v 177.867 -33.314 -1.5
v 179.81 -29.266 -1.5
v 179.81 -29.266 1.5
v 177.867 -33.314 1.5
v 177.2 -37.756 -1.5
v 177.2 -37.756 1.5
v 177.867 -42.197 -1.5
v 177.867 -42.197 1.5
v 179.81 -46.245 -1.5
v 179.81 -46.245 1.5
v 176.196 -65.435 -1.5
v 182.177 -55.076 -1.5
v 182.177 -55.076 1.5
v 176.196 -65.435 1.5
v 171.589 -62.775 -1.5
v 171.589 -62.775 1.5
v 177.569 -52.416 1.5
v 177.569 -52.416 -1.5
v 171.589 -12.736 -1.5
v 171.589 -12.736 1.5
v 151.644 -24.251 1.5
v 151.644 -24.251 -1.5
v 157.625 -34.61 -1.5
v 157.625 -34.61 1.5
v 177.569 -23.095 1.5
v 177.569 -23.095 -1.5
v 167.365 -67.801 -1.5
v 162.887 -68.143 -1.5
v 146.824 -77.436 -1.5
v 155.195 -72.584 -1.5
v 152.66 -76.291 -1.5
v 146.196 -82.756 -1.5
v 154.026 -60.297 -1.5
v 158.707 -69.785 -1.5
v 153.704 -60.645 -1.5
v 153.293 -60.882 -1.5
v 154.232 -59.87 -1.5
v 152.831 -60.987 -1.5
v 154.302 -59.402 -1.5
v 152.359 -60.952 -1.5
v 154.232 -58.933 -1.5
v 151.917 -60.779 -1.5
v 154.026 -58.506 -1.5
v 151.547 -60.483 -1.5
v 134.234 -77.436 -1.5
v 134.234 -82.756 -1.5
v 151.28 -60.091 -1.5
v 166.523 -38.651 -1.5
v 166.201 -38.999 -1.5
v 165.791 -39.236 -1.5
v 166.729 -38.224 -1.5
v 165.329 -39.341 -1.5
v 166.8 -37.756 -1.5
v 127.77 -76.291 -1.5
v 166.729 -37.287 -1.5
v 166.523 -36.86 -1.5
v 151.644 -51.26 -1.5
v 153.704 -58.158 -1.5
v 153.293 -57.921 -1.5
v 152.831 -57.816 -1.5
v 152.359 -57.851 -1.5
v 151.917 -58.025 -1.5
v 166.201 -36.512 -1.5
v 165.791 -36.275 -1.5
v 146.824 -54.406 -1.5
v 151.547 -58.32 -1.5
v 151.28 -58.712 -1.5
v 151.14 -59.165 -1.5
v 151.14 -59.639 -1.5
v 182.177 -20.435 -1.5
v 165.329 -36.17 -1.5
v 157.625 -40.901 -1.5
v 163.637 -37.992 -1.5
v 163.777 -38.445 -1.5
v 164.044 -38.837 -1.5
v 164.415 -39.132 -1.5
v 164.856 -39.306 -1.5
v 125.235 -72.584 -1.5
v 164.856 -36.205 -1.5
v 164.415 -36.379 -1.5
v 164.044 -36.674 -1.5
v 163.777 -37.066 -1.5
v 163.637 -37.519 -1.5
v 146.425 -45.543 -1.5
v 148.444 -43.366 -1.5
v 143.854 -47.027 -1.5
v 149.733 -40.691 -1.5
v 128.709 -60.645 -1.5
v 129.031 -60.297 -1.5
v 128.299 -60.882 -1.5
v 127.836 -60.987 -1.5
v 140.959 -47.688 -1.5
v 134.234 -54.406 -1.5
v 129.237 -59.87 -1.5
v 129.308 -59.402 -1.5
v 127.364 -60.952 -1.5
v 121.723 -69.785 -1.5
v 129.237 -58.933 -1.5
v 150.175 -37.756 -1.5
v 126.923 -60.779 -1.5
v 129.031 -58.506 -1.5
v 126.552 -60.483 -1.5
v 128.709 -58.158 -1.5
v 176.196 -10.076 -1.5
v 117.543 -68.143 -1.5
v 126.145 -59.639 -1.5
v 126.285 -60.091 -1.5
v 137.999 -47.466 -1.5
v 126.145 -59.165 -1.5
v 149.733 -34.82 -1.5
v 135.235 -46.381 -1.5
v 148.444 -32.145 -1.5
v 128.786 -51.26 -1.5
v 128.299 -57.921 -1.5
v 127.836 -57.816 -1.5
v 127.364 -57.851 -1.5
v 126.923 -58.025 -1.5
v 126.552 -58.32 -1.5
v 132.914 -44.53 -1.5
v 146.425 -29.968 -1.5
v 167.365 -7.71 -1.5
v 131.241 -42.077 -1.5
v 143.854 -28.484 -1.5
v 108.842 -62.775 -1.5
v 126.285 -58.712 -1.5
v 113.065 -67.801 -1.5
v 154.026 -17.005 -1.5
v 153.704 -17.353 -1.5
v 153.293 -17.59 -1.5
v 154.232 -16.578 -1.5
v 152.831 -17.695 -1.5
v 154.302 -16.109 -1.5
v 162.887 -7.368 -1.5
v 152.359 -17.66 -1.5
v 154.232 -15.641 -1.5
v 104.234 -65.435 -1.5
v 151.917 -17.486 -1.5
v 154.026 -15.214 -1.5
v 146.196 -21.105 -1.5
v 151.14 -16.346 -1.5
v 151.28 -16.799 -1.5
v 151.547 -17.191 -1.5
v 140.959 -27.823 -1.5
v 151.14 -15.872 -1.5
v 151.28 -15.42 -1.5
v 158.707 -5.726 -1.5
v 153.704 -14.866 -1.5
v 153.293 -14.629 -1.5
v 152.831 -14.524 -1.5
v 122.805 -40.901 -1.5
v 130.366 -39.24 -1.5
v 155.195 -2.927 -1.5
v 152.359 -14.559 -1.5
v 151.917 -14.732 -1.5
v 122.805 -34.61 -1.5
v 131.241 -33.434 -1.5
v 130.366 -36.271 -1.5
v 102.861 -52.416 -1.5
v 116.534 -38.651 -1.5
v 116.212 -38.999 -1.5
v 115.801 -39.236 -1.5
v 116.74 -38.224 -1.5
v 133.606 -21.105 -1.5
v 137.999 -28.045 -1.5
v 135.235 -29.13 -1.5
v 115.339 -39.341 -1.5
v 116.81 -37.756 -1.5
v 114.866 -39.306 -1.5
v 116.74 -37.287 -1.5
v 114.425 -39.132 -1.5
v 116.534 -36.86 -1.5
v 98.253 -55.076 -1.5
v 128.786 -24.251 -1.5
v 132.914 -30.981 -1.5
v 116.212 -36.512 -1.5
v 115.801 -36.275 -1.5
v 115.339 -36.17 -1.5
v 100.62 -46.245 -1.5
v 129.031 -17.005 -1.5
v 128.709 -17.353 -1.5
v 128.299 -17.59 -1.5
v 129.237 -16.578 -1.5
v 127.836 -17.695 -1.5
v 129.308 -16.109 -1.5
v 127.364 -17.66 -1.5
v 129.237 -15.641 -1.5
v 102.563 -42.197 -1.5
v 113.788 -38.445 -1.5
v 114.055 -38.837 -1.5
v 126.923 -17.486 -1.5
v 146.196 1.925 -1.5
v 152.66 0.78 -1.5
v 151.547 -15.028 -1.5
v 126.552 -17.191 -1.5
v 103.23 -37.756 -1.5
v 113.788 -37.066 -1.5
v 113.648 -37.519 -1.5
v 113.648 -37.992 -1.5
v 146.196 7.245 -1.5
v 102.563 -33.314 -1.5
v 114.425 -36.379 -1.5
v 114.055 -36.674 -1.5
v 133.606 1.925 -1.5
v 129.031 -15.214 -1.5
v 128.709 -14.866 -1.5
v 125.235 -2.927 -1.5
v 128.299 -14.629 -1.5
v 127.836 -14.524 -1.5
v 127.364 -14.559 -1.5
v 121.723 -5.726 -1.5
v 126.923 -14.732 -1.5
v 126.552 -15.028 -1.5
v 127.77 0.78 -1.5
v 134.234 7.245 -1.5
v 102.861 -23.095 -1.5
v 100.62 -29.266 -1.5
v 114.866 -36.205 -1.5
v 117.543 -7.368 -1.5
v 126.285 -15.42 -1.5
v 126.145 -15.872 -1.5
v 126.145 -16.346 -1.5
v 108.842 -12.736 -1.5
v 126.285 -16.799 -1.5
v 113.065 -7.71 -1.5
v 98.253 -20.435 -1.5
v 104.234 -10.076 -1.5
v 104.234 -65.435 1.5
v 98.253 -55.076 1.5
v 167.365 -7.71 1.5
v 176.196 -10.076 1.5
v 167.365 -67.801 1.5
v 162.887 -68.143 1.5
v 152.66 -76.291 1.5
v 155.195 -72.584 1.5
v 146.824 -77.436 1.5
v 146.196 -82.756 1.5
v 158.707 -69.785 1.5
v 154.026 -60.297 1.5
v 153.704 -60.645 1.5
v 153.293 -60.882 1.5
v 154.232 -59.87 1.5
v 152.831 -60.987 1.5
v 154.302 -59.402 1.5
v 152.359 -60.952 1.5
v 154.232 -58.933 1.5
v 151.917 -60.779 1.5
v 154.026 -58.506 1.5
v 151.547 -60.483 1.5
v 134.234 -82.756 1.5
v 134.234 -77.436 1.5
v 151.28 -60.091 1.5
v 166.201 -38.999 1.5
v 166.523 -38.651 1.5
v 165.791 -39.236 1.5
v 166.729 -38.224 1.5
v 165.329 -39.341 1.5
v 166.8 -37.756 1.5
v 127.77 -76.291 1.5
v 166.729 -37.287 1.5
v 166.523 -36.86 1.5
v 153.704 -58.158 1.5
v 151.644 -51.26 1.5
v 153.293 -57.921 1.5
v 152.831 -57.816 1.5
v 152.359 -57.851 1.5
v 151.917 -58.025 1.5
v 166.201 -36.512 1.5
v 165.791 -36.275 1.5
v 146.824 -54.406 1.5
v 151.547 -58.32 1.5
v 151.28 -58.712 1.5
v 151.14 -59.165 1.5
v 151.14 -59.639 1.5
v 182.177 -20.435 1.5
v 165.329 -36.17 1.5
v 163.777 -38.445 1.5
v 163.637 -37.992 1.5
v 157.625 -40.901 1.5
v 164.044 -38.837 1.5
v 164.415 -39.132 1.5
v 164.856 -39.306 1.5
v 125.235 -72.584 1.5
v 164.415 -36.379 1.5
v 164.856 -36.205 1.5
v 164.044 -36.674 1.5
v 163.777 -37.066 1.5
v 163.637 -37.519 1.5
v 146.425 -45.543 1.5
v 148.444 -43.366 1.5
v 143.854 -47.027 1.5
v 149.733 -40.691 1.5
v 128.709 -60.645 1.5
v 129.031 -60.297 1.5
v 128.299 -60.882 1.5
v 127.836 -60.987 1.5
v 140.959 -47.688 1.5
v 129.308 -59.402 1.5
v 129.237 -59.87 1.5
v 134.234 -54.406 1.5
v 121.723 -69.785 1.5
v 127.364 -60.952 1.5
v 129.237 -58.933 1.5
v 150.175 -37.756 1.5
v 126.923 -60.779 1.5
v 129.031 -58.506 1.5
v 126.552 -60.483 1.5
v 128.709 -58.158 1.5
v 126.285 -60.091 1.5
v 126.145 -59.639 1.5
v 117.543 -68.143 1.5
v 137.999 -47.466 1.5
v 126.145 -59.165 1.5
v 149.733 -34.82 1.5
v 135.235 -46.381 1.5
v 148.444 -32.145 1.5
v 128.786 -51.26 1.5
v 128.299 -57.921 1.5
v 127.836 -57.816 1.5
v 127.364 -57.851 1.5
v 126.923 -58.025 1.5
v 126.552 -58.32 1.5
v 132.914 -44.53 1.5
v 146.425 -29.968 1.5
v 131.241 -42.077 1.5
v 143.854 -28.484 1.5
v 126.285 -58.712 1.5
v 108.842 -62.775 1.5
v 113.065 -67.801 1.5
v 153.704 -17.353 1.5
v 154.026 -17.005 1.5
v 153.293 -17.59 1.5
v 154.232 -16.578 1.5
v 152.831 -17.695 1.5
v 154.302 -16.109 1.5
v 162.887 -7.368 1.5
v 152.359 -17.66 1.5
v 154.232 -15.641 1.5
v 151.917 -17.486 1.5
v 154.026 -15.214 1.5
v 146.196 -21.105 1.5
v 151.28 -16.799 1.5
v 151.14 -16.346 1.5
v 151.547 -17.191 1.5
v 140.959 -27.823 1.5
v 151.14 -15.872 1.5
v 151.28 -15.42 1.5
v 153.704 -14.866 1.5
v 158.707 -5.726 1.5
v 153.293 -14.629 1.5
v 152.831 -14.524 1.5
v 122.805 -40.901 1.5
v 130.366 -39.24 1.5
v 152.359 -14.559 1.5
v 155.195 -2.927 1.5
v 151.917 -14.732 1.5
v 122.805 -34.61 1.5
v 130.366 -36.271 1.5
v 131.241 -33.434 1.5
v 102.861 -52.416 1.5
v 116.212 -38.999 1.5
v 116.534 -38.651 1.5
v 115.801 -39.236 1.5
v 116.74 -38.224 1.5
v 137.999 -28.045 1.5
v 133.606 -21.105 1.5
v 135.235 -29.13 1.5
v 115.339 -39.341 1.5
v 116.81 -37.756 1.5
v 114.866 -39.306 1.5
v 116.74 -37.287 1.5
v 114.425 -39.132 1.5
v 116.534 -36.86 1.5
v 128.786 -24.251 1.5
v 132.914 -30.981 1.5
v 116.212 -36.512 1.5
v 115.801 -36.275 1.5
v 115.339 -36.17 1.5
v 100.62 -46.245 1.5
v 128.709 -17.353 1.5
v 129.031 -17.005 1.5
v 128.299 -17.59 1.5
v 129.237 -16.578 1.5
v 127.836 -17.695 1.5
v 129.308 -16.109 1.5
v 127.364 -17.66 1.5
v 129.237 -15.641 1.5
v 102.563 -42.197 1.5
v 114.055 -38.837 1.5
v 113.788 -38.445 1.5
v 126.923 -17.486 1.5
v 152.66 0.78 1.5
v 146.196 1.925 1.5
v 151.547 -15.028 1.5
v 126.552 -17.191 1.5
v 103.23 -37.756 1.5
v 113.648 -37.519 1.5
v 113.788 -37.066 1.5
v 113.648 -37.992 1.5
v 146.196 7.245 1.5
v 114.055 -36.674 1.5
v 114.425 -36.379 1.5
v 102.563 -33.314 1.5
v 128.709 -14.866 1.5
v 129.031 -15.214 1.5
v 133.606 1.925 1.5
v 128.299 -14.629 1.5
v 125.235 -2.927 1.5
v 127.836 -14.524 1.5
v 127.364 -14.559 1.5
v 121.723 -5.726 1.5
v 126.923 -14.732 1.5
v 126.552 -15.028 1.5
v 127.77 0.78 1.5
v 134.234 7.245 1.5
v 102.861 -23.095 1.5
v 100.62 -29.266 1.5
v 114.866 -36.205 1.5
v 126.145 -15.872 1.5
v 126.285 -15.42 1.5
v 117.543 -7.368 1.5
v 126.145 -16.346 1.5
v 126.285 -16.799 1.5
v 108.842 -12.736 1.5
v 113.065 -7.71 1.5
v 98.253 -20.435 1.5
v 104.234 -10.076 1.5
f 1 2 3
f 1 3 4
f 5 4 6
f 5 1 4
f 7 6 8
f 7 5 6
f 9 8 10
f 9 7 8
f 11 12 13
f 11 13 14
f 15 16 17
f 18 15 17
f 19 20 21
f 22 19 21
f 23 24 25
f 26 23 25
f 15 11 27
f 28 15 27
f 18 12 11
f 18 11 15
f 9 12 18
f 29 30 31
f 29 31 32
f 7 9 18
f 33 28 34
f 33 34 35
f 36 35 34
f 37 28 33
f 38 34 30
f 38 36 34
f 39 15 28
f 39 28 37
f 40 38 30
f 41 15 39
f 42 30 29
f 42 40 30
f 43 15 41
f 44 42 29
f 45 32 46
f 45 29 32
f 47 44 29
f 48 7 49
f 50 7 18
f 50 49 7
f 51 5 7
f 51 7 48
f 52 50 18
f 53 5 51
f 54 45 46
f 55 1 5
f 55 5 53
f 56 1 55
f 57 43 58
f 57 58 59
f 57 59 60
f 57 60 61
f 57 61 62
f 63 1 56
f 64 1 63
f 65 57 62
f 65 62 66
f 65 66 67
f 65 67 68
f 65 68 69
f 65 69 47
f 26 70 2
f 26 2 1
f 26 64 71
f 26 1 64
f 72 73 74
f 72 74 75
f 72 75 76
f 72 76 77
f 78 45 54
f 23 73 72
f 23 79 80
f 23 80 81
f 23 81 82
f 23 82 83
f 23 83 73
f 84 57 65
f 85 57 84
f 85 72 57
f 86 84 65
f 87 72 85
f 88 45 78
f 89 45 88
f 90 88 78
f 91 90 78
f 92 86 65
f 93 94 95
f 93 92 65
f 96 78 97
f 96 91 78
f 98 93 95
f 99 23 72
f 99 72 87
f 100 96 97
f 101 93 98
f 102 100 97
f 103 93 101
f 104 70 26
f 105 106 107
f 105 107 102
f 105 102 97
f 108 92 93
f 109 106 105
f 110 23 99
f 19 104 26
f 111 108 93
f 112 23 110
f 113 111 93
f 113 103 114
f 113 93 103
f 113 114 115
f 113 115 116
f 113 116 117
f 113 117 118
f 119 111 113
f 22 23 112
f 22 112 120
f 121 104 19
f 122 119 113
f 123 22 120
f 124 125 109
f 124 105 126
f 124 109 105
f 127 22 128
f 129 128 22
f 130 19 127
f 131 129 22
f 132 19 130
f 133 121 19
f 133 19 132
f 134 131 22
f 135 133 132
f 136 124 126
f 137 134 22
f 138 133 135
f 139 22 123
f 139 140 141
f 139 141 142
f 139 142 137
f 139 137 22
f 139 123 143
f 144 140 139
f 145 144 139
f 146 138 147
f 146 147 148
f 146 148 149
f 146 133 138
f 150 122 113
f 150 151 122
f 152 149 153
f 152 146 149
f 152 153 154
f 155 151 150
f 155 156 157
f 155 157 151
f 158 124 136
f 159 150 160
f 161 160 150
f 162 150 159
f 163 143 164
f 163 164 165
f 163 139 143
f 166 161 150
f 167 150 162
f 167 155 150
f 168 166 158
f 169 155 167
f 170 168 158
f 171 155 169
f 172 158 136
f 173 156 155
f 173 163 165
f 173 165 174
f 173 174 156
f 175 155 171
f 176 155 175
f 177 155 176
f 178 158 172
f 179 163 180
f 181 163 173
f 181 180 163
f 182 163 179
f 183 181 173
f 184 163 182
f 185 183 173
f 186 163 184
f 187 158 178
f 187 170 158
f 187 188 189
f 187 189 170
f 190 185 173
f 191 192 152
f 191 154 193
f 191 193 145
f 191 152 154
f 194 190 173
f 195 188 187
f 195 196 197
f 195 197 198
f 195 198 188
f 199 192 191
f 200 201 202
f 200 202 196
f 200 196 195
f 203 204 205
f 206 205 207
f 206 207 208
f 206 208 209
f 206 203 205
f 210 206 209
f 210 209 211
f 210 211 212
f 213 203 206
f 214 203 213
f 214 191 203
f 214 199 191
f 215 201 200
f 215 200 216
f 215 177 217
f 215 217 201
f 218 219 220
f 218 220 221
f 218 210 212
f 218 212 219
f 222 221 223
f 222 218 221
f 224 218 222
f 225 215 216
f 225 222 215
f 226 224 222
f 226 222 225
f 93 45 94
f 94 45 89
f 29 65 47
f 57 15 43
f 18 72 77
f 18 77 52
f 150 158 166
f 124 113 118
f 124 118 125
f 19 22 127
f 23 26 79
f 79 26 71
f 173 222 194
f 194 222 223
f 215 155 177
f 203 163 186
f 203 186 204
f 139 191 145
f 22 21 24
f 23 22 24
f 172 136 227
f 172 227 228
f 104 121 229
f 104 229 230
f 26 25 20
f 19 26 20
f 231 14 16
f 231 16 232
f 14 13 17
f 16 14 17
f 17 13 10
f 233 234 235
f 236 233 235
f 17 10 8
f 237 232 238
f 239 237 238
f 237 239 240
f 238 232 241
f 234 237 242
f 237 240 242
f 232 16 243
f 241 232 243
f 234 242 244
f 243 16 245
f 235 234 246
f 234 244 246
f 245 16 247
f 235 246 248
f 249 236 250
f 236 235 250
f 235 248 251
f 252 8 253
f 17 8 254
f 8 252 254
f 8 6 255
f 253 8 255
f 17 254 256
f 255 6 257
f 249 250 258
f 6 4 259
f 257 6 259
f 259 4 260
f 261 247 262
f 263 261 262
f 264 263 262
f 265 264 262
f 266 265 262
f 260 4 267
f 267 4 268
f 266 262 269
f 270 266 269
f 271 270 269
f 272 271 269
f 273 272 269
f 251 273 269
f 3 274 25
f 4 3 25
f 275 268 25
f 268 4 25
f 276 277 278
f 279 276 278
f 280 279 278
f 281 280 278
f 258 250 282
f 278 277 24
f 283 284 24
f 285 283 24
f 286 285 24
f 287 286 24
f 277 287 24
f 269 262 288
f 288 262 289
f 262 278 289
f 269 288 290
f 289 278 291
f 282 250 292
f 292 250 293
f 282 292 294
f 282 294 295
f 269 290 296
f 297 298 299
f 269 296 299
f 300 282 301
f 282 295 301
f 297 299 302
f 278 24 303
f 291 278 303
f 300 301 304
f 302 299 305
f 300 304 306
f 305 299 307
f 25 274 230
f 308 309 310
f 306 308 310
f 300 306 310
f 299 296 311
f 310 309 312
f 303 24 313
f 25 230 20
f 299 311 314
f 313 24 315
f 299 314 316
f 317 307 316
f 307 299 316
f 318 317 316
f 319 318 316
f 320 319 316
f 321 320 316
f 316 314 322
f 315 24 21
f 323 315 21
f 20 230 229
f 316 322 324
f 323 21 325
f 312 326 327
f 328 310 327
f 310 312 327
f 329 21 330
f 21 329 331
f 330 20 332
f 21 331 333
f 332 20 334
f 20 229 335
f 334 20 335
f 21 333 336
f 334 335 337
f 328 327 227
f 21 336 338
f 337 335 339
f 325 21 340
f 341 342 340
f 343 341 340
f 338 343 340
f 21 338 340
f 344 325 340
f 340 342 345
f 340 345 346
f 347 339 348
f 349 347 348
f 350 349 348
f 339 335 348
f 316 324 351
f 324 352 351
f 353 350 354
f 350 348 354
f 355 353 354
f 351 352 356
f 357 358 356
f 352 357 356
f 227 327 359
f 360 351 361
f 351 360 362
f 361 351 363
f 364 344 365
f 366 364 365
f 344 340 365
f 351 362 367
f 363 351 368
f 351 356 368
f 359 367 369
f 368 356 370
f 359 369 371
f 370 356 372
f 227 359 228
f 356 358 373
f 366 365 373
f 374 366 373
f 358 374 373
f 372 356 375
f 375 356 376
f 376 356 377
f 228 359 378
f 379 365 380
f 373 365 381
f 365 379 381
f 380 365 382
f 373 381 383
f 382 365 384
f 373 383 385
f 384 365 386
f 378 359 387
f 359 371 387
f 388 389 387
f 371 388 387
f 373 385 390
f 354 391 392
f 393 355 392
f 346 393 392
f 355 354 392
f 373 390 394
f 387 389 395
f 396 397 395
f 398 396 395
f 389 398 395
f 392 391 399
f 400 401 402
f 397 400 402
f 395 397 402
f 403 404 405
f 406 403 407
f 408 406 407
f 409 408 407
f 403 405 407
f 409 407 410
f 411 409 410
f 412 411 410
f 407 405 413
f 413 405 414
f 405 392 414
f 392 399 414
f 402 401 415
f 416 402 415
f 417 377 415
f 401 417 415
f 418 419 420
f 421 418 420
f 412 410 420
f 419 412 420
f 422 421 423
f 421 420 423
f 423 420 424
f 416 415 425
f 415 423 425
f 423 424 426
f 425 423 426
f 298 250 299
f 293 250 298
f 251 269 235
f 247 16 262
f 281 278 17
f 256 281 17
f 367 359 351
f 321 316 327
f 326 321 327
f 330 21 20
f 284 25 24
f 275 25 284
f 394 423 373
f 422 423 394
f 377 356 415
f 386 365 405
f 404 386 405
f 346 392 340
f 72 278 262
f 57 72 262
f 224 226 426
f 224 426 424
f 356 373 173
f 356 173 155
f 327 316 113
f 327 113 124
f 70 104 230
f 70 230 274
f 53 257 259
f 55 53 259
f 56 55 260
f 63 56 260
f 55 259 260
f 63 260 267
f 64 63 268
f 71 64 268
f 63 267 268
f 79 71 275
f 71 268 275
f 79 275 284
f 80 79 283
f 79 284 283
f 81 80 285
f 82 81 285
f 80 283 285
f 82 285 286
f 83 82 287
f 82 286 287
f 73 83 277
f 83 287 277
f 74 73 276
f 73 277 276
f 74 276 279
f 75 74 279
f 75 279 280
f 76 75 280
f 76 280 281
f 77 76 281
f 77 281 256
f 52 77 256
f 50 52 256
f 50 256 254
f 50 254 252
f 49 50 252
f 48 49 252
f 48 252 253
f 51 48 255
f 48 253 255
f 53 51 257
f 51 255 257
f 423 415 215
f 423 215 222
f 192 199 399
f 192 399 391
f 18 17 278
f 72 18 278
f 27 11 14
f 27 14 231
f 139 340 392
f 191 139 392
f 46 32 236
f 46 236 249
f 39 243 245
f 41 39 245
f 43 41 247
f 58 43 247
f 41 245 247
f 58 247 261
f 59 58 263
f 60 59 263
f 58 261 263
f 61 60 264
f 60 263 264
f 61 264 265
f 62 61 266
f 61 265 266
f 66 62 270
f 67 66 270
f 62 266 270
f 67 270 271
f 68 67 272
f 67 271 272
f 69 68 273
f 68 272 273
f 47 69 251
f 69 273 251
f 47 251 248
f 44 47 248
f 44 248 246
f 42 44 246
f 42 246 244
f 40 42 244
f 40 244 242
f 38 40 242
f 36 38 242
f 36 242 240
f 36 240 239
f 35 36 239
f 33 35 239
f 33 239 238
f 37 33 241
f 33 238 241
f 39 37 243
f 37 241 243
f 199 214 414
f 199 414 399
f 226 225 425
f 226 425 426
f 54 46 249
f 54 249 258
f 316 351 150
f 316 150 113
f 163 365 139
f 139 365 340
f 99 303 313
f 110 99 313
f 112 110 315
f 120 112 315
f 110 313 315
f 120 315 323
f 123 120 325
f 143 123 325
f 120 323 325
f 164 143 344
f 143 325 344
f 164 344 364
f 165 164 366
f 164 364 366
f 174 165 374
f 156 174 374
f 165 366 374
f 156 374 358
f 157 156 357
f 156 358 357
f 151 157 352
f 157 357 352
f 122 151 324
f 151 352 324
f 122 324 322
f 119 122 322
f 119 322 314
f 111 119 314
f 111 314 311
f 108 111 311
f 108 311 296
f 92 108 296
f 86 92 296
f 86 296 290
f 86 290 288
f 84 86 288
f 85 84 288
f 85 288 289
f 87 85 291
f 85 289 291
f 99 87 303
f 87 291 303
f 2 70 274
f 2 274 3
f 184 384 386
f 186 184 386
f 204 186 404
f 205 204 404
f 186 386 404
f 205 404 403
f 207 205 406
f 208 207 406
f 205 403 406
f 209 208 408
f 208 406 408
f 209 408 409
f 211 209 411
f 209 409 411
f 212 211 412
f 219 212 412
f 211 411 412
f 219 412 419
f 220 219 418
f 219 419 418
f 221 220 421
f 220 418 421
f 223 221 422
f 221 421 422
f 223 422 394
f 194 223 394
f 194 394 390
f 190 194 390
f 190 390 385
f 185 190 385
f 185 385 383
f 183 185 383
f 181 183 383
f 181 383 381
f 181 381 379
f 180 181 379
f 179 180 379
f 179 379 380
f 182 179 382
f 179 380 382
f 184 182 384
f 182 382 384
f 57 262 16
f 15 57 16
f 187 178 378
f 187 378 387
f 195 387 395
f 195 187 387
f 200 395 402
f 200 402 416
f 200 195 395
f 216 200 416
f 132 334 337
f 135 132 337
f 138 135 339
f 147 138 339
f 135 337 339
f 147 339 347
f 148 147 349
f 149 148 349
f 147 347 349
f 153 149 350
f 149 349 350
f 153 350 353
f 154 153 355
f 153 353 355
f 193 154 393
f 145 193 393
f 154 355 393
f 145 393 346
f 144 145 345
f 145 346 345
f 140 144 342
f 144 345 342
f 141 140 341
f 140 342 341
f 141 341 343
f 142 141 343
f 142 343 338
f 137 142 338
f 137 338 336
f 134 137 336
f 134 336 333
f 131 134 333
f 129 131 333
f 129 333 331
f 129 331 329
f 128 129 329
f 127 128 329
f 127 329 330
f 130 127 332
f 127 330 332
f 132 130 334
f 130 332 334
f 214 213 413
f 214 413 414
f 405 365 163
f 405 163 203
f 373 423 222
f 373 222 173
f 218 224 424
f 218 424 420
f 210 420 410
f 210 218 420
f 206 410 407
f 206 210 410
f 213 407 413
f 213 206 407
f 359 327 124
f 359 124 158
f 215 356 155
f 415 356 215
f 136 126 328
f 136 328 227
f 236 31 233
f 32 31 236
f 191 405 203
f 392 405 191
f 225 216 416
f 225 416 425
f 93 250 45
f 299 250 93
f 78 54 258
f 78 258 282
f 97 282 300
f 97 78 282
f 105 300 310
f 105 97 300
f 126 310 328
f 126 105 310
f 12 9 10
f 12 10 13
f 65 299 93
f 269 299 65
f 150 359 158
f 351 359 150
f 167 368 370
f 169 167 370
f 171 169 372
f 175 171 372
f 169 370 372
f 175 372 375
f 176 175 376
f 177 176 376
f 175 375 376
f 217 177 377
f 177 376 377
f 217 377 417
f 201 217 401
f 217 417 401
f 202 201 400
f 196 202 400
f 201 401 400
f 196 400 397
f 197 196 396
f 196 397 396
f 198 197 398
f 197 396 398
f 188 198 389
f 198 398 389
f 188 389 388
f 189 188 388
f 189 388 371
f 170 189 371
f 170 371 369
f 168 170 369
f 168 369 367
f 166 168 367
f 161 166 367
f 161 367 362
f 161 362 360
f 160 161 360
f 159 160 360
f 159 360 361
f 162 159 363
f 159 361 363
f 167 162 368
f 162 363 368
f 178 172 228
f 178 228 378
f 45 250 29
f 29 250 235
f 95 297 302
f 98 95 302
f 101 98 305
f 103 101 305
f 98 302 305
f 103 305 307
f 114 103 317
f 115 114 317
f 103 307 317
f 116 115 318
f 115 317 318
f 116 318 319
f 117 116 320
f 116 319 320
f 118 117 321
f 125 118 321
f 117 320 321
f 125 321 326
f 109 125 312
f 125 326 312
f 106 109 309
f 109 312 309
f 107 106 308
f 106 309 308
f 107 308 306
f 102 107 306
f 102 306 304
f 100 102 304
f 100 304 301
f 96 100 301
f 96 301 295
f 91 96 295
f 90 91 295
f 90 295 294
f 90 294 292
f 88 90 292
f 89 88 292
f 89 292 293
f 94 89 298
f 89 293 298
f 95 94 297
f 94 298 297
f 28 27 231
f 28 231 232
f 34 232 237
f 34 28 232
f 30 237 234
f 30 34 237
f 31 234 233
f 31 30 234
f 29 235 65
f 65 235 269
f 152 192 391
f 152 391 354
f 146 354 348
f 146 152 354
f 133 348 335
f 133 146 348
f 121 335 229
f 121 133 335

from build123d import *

# Parameters (mm, degrees)
BOSS_EXTRUDE1_DEPTH      = 1.5
BOSS_EXTRUDE1_DEPTH_BACK = 1.5
SKETCH2_W                = 12.59
SKETCH2_H                = 23.03
CUT_EXTRUDE1_DEPTH       = 3
SKETCH3_W                = 12.59
SKETCH3_H                = 23.03
CUT_EXTRUDE2_DEPTH       = 3
CUT_EXTRUDE3_DEPTH       = 3
CUT_EXTRUDE4_DEPTH       = 3
CUT_EXTRUDE5_DEPTH       = 3
CUT_EXTRUDE6_DEPTH       = 3
SKETCH8_R                = 9.96
CUT_EXTRUDE7_DEPTH       = 3
SKETCH9_R                = 1.59
CUT_EXTRUDE8_DEPTH       = 3
SKETCH10_R               = 1.59
CUT_EXTRUDE9_DEPTH       = 3


with BuildPart() as part:
    # Sketch1 → Boss-Extrude1 (new, two sides: drawn at the far end of the back side and taken through both)
    with BuildSketch(Plane.XY.offset(-BOSS_EXTRUDE1_DEPTH_BACK)):
        with BuildLine():
            Line((98.253494636, -20.43499635), (104.23425822, -10.0760127))
            Line((104.23425822, -10.0760127), (113.064881921, -7.709853588))
            ThreePointArc((113.064881921, -7.709853588), (121.722656845, -5.725791507), (127.769789966, 0.780032806))
            Line((127.769789966, 0.780032806), (134.234253695, 7.24450012))
            Line((134.234253695, 7.24450012), (146.195780864, 7.24450012))
            Line((146.195780864, 7.24450012), (152.660249109, 0.78003546))
            ThreePointArc((152.660249109, 0.78003546), (158.707381887, -5.725786628), (167.365155021, -7.709848177))
            Line((167.365155021, -7.709848177), (176.195776859, -10.076007288))
            Line((176.195776859, -10.076007288), (182.176542181, -20.434992087))
            Line((182.176542181, -20.434992087), (179.810382355, -29.265616594))
            ThreePointArc((179.810382355, -29.265616594), (177.199740829, -37.75550103), (179.810382355, -46.245385467))
            Line((179.810382355, -46.245385467), (182.176541113, -55.07600785))
            Line((182.176541113, -55.07600785), (176.195778722, -65.434989434))
            Line((176.195778722, -65.434989434), (167.365155827, -67.801148329))
            ThreePointArc((167.365155827, -67.801148329), (158.707382848, -69.785210553), (152.660250576, -76.291033111))
            Line((152.660250576, -76.291033111), (146.195785916, -82.755501356))
            Line((146.195785916, -82.755501356), (134.234258747, -82.755501356))
            Line((134.234258747, -82.755501356), (127.769791434, -76.291037627))
            ThreePointArc((127.769791434, -76.291037627), (121.722657806, -69.785213784), (113.064882728, -67.801152377))
            Line((113.064882728, -67.801152377), (104.23425822, -65.434992551))
            Line((104.23425822, -65.434992551), (98.253494636, -55.076010763))
            Line((98.253494636, -55.076010763), (100.619653747, -46.245388924))
            ThreePointArc((100.619653747, -46.245388924), (103.230295273, -37.755504488), (100.619653747, -29.265620052))
            Line((100.619653747, -29.265620052), (98.253494636, -20.43499635))
        make_face()
    extrude(amount=BOSS_EXTRUDE1_DEPTH + BOSS_EXTRUDE1_DEPTH_BACK)

    # Sketch2 → Cut-Extrude1 (cut)
    with BuildSketch(Plane.XY.offset(1.5)):
        with Locations((139.900780864, -9.59049988)):
            Rectangle(SKETCH2_W, SKETCH2_H)
    extrude(amount=-CUT_EXTRUDE1_DEPTH, mode=Mode.SUBTRACT)

    # Sketch3 → Cut-Extrude2 (cut)
    with BuildSketch(Plane.XY.offset(1.5)):
        with Locations((140.529262159, -65.920502947)):
            Rectangle(SKETCH3_W, SKETCH3_H)
    extrude(amount=-CUT_EXTRUDE2_DEPTH, mode=Mode.SUBTRACT)

    # Sketch4 → Cut-Extrude3 (cut)
    with BuildSketch(Plane.XY.offset(1.5)):
        Polygon((171.588522223, -12.736008176), (151.64395758, -24.251013064), (157.624720423, -34.609993567), (177.569285268, -23.094993214), align=None)
    extrude(amount=-CUT_EXTRUDE3_DEPTH, mode=Mode.SUBTRACT)

    # Sketch5 → Cut-Extrude4 (cut)
    with BuildSketch(Plane.XY.offset(1.5)):
        Polygon((102.86074998, -52.416011103), (122.80531503, -40.901011103), (128.786075877, -51.259992759), (108.841510828, -62.774992759), align=None)
    extrude(amount=-CUT_EXTRUDE4_DEPTH, mode=Mode.SUBTRACT)

    # Sketch6 → Cut-Extrude5 (cut)
    with BuildSketch(Plane.XY.offset(1.5)):
        Polygon((108.841512319, -12.736014517), (128.78607799, -24.25101344), (122.805317347, -34.609996033), (102.860751676, -23.094997111), align=None)
    extrude(amount=-CUT_EXTRUDE5_DEPTH, mode=Mode.SUBTRACT)

    # Sketch7 → Cut-Extrude6 (cut)
    with BuildSketch(Plane.XY.offset(1.5)):
        Polygon((151.643959507, -51.25999177), (171.588525178, -62.774990693), (177.569285821, -52.416008099), (157.62472015, -40.901009176), align=None)
    extrude(amount=-CUT_EXTRUDE6_DEPTH, mode=Mode.SUBTRACT)

    # Sketch8 → Cut-Extrude7 (cut)
    with BuildSketch(Plane.XY.offset(1.5)):
        with Locations((140.215021511, -37.755501414)):
            Circle(SKETCH8_R)
    extrude(amount=-CUT_EXTRUDE7_DEPTH, mode=Mode.SUBTRACT)

    # Sketch9 → Cut-Extrude8 (cut)
    with BuildSketch(Plane.XY.offset(1.5)):
        with Locations((127.717657389, -59.401568952)):
            Circle(SKETCH9_R)
    extrude(amount=-CUT_EXTRUDE8_DEPTH, mode=Mode.SUBTRACT)

    # Sketch10 → Cut-Extrude9 (cut)
    with BuildSketch(Plane.XY.offset(1.5)):
        with Locations((152.712382304, -16.10943146)):
            Circle(SKETCH10_R)
        with Locations((165.209740829, -37.75550103)):
            Circle(SKETCH10_R)
        with Locations((115.220295273, -37.75550103)):
            Circle(SKETCH10_R)
        with Locations((127.717654681, -16.10943146)):
            Circle(SKETCH10_R)
        with Locations((152.712382304, -59.40156591)):
            Circle(SKETCH10_R)
    extrude(amount=-CUT_EXTRUDE9_DEPTH, mode=Mode.SUBTRACT)


solid = part.part
